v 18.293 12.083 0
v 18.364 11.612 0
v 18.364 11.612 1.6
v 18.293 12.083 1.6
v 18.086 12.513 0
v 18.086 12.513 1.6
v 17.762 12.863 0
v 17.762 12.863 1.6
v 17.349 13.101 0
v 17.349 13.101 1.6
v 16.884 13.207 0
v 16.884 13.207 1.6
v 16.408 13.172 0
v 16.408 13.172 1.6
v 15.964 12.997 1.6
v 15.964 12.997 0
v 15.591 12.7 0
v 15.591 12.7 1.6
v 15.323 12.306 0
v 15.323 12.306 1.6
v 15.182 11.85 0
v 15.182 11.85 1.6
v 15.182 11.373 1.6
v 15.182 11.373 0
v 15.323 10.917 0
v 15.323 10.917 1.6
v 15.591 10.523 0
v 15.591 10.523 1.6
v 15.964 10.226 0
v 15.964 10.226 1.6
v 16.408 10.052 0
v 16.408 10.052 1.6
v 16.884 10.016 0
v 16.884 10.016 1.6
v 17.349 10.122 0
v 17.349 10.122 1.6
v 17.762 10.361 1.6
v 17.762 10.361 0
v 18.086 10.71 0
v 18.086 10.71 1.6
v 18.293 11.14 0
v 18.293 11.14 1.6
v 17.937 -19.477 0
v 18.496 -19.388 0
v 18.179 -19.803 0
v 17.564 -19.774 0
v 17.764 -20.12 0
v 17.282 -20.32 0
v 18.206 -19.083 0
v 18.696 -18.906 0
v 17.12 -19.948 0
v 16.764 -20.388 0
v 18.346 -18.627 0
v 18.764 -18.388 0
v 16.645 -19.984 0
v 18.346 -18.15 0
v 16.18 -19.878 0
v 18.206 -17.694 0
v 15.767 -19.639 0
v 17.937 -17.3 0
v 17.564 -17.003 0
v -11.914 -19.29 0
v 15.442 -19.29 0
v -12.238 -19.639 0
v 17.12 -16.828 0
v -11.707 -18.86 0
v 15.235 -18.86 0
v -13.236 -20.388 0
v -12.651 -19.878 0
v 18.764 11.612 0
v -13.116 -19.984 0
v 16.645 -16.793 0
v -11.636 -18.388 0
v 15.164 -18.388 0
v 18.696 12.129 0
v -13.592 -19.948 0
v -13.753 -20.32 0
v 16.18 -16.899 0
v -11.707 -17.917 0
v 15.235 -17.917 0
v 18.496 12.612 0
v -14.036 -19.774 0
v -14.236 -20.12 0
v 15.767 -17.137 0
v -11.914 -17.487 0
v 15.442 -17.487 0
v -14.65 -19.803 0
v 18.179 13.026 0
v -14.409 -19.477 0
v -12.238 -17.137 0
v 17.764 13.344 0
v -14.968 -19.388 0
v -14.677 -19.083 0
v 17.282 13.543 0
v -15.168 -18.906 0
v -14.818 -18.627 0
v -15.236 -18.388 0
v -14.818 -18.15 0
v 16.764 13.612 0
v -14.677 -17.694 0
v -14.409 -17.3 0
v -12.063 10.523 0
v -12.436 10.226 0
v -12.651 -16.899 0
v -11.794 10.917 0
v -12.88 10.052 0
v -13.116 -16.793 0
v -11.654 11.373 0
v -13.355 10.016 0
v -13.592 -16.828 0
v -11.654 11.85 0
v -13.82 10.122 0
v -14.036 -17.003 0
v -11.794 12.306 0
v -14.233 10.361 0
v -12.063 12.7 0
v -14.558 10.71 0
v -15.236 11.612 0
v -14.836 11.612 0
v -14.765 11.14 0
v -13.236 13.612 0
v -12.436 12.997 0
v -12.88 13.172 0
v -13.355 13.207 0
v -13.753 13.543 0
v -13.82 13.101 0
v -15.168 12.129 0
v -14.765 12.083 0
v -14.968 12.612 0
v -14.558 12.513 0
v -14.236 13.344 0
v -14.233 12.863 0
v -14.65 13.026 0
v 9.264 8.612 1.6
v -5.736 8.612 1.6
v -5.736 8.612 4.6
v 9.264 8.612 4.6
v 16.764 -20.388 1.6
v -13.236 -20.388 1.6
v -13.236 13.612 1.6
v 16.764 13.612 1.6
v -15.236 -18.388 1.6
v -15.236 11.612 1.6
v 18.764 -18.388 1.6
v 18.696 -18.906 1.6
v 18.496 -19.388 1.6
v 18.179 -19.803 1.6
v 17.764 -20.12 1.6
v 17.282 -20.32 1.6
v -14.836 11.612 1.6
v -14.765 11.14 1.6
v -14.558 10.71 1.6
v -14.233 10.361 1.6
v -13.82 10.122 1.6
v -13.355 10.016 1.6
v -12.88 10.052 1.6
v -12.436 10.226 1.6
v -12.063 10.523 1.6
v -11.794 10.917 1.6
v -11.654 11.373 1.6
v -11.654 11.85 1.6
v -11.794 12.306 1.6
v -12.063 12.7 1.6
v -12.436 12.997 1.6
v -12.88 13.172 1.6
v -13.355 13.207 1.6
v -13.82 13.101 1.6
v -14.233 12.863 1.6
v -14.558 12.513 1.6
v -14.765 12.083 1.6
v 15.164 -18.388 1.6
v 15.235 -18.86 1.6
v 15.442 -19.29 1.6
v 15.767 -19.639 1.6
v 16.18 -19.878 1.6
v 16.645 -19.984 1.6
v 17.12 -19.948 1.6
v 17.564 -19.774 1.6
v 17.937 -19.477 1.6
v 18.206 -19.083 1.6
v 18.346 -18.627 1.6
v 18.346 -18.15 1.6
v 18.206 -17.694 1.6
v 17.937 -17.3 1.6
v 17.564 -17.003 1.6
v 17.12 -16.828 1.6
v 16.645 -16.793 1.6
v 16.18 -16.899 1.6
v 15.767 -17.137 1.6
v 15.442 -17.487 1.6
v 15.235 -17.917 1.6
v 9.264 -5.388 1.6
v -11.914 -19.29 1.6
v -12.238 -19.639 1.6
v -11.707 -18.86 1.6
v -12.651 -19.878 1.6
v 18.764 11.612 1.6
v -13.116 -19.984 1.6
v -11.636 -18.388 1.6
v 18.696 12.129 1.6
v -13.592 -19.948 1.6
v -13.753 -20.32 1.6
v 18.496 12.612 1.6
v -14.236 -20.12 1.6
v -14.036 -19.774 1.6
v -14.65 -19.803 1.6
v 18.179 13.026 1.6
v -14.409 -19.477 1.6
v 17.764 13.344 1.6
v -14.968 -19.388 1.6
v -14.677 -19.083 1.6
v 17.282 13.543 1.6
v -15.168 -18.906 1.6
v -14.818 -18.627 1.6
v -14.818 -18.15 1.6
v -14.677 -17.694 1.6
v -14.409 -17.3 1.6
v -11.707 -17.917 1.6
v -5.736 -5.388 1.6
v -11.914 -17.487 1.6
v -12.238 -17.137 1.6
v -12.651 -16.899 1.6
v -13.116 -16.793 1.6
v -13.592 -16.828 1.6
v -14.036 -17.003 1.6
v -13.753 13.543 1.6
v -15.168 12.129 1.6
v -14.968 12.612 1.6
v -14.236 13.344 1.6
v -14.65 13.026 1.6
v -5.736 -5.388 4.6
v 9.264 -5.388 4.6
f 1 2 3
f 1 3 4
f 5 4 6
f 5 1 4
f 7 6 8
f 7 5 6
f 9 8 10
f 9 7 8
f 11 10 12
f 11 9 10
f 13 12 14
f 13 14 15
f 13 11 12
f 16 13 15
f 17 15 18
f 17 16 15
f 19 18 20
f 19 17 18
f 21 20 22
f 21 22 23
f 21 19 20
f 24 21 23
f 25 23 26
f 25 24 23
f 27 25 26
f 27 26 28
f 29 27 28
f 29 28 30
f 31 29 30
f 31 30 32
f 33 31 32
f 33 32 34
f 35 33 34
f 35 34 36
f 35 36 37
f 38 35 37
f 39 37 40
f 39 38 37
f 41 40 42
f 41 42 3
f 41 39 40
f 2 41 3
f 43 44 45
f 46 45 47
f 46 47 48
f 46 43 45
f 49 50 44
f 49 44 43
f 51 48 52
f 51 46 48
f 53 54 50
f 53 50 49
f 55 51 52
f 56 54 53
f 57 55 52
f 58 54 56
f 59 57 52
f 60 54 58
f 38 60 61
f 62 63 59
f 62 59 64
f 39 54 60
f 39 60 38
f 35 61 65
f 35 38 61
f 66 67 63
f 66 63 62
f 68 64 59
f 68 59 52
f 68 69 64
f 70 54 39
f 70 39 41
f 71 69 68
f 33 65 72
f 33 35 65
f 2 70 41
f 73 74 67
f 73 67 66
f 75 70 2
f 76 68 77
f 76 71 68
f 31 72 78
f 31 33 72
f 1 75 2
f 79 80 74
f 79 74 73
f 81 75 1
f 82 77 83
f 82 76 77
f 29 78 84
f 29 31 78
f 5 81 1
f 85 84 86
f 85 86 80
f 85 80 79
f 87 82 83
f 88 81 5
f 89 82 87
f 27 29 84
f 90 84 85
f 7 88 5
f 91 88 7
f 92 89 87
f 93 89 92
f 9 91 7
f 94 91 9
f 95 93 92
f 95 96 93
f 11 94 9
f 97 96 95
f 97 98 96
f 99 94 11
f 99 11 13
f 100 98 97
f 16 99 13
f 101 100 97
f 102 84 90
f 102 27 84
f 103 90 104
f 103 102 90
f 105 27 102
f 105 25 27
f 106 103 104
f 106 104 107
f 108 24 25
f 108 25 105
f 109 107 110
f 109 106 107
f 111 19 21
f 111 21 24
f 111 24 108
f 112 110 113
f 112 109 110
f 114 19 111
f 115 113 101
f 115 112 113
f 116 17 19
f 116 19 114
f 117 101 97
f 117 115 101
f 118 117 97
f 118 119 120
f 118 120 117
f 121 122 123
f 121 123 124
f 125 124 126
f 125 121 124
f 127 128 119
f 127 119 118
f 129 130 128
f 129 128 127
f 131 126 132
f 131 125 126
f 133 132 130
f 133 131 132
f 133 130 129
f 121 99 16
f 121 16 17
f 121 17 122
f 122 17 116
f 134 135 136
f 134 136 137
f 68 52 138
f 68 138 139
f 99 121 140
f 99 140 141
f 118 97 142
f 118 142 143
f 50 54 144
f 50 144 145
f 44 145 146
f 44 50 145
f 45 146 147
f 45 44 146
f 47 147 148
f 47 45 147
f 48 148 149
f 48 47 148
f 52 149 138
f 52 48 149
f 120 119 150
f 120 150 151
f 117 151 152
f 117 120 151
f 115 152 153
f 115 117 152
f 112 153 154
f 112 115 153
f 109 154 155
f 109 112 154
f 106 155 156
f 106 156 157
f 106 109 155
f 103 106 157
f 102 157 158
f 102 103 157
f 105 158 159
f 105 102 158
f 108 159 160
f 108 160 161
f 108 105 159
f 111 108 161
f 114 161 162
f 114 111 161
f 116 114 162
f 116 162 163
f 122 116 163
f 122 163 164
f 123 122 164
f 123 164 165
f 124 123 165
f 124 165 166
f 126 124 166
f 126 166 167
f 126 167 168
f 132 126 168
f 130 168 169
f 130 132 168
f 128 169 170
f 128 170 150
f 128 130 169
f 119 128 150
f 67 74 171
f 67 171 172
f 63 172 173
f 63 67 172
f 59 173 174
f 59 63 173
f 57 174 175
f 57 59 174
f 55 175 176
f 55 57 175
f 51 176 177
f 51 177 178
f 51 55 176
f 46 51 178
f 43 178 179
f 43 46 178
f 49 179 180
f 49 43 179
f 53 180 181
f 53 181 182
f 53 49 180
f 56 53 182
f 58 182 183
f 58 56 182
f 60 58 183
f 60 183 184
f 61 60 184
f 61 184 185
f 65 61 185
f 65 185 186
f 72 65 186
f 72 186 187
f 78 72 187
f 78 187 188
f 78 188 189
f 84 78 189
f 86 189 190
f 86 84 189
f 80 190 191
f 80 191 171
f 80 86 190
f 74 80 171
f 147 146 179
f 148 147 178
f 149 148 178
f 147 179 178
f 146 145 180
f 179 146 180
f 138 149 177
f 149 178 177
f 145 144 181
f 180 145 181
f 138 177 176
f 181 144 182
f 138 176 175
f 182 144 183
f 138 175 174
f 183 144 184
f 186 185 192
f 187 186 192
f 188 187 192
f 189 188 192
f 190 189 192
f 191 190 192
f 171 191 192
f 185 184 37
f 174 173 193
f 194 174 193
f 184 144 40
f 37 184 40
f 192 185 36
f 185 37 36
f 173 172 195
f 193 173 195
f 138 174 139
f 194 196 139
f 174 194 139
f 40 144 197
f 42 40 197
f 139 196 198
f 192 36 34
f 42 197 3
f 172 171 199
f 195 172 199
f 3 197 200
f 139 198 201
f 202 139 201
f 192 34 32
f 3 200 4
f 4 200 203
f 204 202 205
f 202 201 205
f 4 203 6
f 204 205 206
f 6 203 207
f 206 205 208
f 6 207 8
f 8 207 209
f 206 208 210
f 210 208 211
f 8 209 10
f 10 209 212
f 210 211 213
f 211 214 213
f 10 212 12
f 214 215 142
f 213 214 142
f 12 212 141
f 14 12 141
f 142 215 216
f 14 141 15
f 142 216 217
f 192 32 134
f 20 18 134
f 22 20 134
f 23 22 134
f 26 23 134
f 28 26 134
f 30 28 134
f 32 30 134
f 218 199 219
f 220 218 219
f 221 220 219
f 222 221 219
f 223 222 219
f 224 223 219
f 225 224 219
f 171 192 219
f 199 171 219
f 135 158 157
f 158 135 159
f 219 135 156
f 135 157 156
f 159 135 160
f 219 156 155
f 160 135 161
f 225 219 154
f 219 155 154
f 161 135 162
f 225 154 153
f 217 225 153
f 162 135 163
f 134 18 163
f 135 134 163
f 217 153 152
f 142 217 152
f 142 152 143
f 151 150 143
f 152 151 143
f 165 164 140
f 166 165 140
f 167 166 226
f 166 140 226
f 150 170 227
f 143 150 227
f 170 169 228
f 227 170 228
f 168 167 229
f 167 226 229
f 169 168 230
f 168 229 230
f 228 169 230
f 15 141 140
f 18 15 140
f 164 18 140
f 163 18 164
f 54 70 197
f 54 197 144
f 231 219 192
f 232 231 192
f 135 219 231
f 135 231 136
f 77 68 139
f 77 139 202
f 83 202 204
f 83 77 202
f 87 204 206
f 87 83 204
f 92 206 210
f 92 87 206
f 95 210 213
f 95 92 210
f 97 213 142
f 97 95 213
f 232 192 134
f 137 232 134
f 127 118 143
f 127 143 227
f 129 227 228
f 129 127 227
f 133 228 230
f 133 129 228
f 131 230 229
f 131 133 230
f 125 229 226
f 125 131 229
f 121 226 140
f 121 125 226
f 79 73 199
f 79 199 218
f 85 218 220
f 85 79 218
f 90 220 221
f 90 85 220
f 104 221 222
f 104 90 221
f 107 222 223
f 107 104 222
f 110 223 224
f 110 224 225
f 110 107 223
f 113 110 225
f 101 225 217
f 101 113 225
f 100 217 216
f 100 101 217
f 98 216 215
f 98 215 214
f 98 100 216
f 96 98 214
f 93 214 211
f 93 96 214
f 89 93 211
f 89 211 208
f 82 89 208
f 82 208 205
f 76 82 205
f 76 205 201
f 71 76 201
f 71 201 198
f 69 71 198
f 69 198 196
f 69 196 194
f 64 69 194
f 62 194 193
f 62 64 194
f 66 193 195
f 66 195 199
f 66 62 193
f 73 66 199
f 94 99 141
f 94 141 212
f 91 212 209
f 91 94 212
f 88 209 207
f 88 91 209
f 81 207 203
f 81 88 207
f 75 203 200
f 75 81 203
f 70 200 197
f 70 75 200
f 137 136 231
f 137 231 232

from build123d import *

# Parameters (mm, degrees)
SKETCH1_R           = 1.6
BOSS_EXTRUDE1_DEPTH = 1.6
SKETCH3_W           = 15
SKETCH3_H           = 14
BOSS_EXTRUDE2_DEPTH = 3


with BuildPart() as part:
    # Sketch1 → Boss-Extrude1 (new body)
    with BuildSketch(Plane.XY):
        with BuildLine():
            Line((-13.235657624, 13.611622239), (16.764342376, 13.611622239))
            ThreePointArc((16.764342376, 13.611622239), (18.178555938, 13.025835801), (18.764342376, 11.611622239))
            Line((18.764342376, 11.611622239), (18.764342376, -18.388377761))
            ThreePointArc((18.764342376, -18.388377761), (18.178555938, -19.802591324), (16.764342376, -20.388377761))
            Line((16.764342376, -20.388377761), (-13.235657624, -20.388377761))
            ThreePointArc((-13.235657624, -20.388377761), (-14.649871187, -19.802591324), (-15.235657624, -18.388377761))
            Line((-15.235657624, -18.388377761), (-15.235657624, 11.611622239))
            ThreePointArc((-15.235657624, 11.611622239), (-14.649871187, 13.025835801), (-13.235657624, 13.611622239))
        make_face()
        with Locations((16.764342376, 11.611622239)):
            Circle(SKETCH1_R, mode=Mode.SUBTRACT)
        with Locations(Location((16.764342376, -18.388377761, 0), (0, 0, 180))):
            Circle(SKETCH1_R, mode=Mode.SUBTRACT)
        with Locations(Location((-13.235657624, 11.611622239, 0), (0, 0, 180))):
            Circle(SKETCH1_R, mode=Mode.SUBTRACT)
        with Locations((-13.235657624, -18.388377761)):
            Circle(SKETCH1_R, mode=Mode.SUBTRACT)
    extrude(amount=BOSS_EXTRUDE1_DEPTH)

    # Sketch3 → Boss-Extrude2 (add)
    with BuildSketch(Plane.XY.offset(1.6)):
        with Locations((1.764342376, 1.611622239)):
            Rectangle(SKETCH3_W, SKETCH3_H)
    extrude(amount=BOSS_EXTRUDE2_DEPTH)


solid = part.part
